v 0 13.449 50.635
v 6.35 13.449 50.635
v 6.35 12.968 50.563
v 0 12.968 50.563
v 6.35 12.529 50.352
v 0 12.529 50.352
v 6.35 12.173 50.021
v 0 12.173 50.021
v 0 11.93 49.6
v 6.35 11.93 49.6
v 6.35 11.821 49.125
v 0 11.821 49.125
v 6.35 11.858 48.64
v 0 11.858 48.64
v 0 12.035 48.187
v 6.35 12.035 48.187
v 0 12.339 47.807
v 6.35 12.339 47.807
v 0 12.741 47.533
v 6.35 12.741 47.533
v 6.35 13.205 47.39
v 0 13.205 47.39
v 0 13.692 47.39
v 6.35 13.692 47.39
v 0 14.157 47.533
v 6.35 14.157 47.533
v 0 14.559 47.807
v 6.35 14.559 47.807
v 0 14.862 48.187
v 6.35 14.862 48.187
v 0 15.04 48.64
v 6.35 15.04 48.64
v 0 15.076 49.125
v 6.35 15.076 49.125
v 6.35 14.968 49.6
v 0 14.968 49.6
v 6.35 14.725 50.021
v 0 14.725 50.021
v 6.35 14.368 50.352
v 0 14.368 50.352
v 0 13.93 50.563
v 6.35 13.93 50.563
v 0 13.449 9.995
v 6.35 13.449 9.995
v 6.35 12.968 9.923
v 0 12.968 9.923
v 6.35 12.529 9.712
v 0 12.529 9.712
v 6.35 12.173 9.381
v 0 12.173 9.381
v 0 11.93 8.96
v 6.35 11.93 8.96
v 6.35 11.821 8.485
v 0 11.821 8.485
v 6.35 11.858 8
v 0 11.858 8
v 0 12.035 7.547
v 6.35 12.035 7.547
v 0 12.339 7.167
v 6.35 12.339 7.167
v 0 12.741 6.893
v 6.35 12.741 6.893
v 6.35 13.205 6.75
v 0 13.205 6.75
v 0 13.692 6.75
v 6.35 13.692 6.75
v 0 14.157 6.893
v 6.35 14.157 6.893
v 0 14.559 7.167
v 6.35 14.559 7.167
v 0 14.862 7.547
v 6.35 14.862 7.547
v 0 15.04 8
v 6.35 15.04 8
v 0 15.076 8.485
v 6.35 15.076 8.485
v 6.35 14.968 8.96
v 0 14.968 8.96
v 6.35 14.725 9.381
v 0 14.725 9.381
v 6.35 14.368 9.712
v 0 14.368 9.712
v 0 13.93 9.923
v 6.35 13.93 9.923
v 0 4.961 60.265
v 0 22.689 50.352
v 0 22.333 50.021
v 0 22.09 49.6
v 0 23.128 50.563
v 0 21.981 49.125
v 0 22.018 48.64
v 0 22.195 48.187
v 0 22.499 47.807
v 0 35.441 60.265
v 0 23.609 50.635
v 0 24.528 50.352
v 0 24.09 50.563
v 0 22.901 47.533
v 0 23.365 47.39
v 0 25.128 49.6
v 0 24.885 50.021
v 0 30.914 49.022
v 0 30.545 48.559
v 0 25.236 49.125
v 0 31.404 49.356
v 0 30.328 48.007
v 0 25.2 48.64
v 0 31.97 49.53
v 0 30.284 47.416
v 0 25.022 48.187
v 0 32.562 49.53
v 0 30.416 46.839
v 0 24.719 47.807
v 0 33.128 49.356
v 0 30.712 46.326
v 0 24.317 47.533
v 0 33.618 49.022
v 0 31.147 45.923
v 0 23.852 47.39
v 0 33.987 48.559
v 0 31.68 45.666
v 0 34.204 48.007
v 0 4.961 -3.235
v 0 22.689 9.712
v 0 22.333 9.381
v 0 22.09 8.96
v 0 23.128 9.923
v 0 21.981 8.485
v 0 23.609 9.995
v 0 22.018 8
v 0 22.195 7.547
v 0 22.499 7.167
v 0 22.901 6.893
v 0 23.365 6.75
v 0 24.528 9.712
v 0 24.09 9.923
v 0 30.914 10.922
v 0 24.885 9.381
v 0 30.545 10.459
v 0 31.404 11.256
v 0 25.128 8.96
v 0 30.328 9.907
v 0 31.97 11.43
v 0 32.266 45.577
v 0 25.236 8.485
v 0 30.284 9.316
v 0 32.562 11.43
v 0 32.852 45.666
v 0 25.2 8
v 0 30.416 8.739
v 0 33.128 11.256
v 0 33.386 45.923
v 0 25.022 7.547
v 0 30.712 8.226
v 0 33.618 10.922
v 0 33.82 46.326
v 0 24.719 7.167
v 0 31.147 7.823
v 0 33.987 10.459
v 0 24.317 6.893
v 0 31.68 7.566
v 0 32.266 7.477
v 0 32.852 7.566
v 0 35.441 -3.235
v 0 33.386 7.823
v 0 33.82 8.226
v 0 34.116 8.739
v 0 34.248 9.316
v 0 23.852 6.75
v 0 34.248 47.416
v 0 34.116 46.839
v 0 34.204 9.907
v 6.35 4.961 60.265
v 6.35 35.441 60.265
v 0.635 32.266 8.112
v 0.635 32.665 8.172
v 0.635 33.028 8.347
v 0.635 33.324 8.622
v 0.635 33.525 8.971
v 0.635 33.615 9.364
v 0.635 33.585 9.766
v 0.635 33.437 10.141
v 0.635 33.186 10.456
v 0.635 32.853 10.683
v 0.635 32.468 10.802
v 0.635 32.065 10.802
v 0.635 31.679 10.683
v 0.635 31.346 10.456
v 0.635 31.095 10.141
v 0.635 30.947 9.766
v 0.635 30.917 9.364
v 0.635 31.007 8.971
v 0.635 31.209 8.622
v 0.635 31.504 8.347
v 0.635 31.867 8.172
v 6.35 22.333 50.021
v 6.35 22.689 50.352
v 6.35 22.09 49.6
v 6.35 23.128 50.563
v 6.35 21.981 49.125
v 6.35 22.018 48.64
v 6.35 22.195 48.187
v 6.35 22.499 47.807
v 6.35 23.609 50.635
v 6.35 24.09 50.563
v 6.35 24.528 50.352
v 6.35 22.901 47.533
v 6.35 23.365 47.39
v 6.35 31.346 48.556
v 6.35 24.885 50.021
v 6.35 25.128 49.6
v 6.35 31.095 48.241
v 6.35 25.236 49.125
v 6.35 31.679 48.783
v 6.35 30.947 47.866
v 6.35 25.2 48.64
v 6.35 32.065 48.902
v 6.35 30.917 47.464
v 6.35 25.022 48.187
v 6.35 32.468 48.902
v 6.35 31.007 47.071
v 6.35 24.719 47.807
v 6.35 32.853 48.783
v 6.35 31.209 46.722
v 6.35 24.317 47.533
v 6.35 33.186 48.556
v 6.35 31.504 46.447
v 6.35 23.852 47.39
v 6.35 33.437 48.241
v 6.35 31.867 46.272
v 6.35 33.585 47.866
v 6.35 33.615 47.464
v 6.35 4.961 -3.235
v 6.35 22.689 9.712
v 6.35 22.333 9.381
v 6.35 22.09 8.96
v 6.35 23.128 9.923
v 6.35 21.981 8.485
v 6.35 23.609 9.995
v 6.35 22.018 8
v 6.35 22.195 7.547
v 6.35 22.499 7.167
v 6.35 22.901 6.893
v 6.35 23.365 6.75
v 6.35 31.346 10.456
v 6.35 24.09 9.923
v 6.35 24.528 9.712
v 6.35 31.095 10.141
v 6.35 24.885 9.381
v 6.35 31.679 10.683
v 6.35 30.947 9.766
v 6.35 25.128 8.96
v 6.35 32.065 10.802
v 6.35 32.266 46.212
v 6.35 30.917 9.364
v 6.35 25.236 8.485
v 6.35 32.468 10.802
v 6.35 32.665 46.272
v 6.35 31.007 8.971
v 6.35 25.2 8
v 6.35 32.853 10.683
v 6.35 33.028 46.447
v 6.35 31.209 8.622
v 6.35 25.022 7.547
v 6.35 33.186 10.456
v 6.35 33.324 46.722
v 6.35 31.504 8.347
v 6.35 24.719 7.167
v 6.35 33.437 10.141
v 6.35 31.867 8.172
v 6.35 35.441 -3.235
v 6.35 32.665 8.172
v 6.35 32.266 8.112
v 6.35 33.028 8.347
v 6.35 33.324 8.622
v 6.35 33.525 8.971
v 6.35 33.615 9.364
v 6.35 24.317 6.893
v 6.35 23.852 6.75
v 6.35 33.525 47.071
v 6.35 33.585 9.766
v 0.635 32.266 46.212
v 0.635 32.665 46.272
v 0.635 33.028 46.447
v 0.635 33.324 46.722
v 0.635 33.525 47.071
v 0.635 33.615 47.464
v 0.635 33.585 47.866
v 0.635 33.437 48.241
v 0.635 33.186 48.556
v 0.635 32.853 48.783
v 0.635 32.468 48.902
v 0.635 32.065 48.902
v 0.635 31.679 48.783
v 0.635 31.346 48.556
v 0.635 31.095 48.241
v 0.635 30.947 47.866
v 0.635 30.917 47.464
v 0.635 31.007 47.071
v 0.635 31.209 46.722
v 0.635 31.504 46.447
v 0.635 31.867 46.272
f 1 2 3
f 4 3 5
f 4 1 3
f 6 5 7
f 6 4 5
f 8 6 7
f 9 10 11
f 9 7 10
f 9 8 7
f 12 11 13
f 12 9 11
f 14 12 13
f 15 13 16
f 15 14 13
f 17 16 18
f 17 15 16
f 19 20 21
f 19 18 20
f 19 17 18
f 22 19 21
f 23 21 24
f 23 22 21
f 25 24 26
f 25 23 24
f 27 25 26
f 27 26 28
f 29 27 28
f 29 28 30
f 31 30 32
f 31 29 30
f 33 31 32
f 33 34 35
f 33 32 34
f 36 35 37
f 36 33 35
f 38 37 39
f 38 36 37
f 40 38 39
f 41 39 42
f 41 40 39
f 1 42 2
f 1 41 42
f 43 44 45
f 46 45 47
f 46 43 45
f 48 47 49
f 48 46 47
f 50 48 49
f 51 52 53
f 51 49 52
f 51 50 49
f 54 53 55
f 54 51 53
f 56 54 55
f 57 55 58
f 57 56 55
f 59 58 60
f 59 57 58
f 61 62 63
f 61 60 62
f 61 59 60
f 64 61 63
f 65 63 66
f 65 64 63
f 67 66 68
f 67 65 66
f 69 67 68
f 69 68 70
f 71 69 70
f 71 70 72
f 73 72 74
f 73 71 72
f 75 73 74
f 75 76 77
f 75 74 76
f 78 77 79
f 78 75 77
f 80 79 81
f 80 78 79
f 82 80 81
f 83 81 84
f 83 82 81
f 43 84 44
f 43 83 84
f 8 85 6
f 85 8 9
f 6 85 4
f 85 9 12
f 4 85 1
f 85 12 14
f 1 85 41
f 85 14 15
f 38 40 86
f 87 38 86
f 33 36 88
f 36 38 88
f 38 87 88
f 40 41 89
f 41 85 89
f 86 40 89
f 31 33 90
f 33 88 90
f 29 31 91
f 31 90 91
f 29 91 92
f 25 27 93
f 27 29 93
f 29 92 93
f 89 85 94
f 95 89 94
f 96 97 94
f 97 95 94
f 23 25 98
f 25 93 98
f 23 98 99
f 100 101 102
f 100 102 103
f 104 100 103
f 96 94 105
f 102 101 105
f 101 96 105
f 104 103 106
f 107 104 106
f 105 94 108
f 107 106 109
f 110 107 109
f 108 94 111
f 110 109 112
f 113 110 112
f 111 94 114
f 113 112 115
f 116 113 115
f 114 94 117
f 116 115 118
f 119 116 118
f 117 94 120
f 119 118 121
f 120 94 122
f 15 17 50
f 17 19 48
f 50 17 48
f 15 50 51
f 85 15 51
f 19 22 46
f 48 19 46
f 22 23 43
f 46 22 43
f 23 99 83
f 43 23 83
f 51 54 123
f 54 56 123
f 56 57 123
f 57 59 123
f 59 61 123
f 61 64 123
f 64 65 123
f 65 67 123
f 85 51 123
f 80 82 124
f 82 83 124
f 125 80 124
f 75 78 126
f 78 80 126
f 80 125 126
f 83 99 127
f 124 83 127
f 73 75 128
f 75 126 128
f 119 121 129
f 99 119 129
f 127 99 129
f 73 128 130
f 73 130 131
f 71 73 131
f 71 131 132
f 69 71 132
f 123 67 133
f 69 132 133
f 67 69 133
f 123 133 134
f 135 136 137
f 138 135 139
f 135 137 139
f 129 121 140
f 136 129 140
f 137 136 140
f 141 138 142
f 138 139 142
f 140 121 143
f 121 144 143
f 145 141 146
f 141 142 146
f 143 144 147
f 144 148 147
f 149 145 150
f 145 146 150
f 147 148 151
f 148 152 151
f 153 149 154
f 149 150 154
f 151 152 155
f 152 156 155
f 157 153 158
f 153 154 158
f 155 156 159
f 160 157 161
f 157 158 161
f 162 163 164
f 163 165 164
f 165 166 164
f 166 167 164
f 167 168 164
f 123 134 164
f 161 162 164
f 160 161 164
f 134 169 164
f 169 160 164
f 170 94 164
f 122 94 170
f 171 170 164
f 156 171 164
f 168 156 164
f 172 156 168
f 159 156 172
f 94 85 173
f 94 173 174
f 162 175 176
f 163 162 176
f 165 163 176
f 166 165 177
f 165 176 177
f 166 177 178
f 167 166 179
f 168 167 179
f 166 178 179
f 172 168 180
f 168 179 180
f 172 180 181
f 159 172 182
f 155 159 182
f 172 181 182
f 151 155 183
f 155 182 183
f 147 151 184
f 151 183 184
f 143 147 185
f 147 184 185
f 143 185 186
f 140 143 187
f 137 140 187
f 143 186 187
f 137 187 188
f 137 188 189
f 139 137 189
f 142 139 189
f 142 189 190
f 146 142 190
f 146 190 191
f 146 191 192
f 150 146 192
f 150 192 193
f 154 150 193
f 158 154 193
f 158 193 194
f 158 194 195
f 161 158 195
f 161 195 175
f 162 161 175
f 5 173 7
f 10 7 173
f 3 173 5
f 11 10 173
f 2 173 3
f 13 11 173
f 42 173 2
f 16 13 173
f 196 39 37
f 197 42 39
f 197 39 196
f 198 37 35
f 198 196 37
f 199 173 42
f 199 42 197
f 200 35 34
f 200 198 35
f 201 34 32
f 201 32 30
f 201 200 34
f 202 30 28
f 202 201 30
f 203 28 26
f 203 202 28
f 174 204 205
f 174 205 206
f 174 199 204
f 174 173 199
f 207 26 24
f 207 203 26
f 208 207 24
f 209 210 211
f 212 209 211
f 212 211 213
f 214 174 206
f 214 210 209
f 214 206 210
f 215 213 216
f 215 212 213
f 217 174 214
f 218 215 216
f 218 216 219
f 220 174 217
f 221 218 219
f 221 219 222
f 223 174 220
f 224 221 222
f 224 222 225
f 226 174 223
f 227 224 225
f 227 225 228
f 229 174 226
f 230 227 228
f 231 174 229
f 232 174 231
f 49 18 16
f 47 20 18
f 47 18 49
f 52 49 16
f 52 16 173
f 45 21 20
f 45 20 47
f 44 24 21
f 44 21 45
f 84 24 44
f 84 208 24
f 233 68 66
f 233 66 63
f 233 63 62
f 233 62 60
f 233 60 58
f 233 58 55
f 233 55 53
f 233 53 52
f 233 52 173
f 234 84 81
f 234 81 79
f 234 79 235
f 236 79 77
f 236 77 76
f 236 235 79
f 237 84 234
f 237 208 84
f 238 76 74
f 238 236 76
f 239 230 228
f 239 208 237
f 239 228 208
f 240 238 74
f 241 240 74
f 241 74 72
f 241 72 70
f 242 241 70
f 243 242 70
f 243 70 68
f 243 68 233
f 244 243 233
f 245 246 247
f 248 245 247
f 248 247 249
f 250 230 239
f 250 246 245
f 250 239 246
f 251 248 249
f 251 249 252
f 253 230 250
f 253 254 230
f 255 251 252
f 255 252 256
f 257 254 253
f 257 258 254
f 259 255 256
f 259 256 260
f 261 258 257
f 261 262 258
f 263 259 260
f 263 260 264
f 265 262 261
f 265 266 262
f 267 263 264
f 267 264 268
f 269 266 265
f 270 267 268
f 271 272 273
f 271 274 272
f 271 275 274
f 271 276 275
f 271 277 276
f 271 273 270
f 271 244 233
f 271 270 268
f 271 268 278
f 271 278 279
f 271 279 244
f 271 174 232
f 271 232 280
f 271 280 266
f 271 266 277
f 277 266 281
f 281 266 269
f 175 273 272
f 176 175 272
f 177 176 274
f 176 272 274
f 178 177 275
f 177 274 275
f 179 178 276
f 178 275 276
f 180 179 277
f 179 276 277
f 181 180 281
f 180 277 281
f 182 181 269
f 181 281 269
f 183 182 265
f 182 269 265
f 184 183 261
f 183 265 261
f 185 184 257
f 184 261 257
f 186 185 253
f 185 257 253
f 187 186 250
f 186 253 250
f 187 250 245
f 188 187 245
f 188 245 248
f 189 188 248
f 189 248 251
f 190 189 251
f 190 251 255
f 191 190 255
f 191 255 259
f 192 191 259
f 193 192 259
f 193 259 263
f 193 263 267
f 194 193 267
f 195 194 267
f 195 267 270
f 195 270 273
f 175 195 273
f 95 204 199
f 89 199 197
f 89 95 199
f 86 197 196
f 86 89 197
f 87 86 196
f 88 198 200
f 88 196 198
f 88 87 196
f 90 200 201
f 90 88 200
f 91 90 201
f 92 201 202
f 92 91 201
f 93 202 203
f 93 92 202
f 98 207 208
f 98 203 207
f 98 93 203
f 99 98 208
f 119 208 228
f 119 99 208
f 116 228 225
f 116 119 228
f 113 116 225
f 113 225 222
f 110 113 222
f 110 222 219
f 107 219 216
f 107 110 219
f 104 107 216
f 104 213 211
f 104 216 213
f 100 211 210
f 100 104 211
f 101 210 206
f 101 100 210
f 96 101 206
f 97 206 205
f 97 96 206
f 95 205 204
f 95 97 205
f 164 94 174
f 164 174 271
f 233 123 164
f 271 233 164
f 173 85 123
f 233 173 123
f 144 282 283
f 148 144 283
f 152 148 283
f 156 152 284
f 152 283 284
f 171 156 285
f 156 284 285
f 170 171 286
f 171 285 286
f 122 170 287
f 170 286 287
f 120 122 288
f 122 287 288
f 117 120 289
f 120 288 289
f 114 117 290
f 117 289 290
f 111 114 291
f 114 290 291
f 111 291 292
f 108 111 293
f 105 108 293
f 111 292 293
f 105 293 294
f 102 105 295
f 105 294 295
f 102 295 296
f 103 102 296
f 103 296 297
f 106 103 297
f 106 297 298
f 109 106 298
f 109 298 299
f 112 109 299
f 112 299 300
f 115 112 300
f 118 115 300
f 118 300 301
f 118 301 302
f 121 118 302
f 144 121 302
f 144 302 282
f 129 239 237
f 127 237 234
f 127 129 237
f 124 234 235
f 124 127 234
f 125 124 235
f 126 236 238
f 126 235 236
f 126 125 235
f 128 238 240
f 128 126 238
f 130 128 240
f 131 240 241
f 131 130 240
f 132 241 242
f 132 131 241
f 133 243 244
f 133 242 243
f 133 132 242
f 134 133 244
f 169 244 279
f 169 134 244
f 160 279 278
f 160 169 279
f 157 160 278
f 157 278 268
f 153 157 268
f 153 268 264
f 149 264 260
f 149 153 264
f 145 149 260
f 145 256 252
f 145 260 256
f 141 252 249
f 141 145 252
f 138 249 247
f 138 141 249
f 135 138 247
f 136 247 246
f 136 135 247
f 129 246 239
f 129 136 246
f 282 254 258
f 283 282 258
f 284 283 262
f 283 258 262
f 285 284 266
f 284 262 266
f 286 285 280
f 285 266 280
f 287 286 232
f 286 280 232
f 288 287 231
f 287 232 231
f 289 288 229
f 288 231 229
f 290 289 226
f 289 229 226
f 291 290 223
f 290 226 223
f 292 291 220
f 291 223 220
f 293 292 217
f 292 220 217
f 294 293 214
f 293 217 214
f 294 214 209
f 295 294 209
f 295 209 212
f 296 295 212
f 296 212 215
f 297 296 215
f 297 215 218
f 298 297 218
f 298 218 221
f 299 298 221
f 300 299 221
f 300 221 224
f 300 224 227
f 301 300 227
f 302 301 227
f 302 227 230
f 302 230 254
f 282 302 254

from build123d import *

# Parameters (mm, degrees)
SKETCH1_W                           = 63.5
SKETCH1_H                           = 30.48
BOSS_EXTRUDE1_DEPTH                 = 6.35
TAP_DRILL_FOR_6_32_TAP1_D           = 2.7051
TAP_DRILL_FOR_6_32_TAP1_DEPTH       = 6.35
TAP_DRILL_FOR_6_32_TAP1_CSINK_D     = 3.9751
TAP_DRILL_FOR_6_32_TAP1_CSINK_ANGLE = 90
LPATTERN1_COUNT                     = 2
LPATTERN1_PITCH                     = 40.64
LPATTERN1_COUNT_DIR2                = 2
LPATTERN1_PITCH_DIR2                = 10.16


with BuildPart() as part:
    # Sketch1 → Boss-Extrude1 (new body)
    with BuildSketch(Plane(origin=(0, 0, 0), x_dir=(0, 0, -1), z_dir=(1, 0, 0))):
        with Locations((-28.514872299, 20.201128374)):
            Rectangle(SKETCH1_W, SKETCH1_H)
    extrude(amount=BOSS_EXTRUDE1_DEPTH)

    # Tap Drill for #6-32 Tap1
    with Locations(Plane.ZY):
        with Locations((9.464872299, 32.266128374), (47.564872299, 32.266128374)):
            CounterSinkHole(TAP_DRILL_FOR_6_32_TAP1_D / 2, TAP_DRILL_FOR_6_32_TAP1_CSINK_D / 2, depth=TAP_DRILL_FOR_6_32_TAP1_DEPTH, counter_sink_angle=TAP_DRILL_FOR_6_32_TAP1_CSINK_ANGLE)

    # Sketch8 → #5 Clearance Hole1 (revolve, cut)
    with BuildSketch(Plane(origin=(0, 23.60868099, 8.363470458), x_dir=(0, 0, 1), z_dir=(0, 1, 0))):
        Polygon((0, 0), (0, 13.680574487), (1.63195, 12.7), (1.63195, 0), align=None)
    f_5_clearance_hole1 = revolve(axis=Axis((-6.35, 23.60868099, 8.363470458), (1, 0, 0)), mode=Mode.SUBTRACT)

    # LPattern1: 5 Clearance Hole1 2 × 2
    with Locations(*[(0, -j * LPATTERN1_PITCH_DIR2, i * LPATTERN1_PITCH) for i in range(LPATTERN1_COUNT) for j in range(LPATTERN1_COUNT_DIR2) if (i, j) != (0, 0)]):
        add(f_5_clearance_hole1, mode=Mode.SUBTRACT)


solid = part.part
